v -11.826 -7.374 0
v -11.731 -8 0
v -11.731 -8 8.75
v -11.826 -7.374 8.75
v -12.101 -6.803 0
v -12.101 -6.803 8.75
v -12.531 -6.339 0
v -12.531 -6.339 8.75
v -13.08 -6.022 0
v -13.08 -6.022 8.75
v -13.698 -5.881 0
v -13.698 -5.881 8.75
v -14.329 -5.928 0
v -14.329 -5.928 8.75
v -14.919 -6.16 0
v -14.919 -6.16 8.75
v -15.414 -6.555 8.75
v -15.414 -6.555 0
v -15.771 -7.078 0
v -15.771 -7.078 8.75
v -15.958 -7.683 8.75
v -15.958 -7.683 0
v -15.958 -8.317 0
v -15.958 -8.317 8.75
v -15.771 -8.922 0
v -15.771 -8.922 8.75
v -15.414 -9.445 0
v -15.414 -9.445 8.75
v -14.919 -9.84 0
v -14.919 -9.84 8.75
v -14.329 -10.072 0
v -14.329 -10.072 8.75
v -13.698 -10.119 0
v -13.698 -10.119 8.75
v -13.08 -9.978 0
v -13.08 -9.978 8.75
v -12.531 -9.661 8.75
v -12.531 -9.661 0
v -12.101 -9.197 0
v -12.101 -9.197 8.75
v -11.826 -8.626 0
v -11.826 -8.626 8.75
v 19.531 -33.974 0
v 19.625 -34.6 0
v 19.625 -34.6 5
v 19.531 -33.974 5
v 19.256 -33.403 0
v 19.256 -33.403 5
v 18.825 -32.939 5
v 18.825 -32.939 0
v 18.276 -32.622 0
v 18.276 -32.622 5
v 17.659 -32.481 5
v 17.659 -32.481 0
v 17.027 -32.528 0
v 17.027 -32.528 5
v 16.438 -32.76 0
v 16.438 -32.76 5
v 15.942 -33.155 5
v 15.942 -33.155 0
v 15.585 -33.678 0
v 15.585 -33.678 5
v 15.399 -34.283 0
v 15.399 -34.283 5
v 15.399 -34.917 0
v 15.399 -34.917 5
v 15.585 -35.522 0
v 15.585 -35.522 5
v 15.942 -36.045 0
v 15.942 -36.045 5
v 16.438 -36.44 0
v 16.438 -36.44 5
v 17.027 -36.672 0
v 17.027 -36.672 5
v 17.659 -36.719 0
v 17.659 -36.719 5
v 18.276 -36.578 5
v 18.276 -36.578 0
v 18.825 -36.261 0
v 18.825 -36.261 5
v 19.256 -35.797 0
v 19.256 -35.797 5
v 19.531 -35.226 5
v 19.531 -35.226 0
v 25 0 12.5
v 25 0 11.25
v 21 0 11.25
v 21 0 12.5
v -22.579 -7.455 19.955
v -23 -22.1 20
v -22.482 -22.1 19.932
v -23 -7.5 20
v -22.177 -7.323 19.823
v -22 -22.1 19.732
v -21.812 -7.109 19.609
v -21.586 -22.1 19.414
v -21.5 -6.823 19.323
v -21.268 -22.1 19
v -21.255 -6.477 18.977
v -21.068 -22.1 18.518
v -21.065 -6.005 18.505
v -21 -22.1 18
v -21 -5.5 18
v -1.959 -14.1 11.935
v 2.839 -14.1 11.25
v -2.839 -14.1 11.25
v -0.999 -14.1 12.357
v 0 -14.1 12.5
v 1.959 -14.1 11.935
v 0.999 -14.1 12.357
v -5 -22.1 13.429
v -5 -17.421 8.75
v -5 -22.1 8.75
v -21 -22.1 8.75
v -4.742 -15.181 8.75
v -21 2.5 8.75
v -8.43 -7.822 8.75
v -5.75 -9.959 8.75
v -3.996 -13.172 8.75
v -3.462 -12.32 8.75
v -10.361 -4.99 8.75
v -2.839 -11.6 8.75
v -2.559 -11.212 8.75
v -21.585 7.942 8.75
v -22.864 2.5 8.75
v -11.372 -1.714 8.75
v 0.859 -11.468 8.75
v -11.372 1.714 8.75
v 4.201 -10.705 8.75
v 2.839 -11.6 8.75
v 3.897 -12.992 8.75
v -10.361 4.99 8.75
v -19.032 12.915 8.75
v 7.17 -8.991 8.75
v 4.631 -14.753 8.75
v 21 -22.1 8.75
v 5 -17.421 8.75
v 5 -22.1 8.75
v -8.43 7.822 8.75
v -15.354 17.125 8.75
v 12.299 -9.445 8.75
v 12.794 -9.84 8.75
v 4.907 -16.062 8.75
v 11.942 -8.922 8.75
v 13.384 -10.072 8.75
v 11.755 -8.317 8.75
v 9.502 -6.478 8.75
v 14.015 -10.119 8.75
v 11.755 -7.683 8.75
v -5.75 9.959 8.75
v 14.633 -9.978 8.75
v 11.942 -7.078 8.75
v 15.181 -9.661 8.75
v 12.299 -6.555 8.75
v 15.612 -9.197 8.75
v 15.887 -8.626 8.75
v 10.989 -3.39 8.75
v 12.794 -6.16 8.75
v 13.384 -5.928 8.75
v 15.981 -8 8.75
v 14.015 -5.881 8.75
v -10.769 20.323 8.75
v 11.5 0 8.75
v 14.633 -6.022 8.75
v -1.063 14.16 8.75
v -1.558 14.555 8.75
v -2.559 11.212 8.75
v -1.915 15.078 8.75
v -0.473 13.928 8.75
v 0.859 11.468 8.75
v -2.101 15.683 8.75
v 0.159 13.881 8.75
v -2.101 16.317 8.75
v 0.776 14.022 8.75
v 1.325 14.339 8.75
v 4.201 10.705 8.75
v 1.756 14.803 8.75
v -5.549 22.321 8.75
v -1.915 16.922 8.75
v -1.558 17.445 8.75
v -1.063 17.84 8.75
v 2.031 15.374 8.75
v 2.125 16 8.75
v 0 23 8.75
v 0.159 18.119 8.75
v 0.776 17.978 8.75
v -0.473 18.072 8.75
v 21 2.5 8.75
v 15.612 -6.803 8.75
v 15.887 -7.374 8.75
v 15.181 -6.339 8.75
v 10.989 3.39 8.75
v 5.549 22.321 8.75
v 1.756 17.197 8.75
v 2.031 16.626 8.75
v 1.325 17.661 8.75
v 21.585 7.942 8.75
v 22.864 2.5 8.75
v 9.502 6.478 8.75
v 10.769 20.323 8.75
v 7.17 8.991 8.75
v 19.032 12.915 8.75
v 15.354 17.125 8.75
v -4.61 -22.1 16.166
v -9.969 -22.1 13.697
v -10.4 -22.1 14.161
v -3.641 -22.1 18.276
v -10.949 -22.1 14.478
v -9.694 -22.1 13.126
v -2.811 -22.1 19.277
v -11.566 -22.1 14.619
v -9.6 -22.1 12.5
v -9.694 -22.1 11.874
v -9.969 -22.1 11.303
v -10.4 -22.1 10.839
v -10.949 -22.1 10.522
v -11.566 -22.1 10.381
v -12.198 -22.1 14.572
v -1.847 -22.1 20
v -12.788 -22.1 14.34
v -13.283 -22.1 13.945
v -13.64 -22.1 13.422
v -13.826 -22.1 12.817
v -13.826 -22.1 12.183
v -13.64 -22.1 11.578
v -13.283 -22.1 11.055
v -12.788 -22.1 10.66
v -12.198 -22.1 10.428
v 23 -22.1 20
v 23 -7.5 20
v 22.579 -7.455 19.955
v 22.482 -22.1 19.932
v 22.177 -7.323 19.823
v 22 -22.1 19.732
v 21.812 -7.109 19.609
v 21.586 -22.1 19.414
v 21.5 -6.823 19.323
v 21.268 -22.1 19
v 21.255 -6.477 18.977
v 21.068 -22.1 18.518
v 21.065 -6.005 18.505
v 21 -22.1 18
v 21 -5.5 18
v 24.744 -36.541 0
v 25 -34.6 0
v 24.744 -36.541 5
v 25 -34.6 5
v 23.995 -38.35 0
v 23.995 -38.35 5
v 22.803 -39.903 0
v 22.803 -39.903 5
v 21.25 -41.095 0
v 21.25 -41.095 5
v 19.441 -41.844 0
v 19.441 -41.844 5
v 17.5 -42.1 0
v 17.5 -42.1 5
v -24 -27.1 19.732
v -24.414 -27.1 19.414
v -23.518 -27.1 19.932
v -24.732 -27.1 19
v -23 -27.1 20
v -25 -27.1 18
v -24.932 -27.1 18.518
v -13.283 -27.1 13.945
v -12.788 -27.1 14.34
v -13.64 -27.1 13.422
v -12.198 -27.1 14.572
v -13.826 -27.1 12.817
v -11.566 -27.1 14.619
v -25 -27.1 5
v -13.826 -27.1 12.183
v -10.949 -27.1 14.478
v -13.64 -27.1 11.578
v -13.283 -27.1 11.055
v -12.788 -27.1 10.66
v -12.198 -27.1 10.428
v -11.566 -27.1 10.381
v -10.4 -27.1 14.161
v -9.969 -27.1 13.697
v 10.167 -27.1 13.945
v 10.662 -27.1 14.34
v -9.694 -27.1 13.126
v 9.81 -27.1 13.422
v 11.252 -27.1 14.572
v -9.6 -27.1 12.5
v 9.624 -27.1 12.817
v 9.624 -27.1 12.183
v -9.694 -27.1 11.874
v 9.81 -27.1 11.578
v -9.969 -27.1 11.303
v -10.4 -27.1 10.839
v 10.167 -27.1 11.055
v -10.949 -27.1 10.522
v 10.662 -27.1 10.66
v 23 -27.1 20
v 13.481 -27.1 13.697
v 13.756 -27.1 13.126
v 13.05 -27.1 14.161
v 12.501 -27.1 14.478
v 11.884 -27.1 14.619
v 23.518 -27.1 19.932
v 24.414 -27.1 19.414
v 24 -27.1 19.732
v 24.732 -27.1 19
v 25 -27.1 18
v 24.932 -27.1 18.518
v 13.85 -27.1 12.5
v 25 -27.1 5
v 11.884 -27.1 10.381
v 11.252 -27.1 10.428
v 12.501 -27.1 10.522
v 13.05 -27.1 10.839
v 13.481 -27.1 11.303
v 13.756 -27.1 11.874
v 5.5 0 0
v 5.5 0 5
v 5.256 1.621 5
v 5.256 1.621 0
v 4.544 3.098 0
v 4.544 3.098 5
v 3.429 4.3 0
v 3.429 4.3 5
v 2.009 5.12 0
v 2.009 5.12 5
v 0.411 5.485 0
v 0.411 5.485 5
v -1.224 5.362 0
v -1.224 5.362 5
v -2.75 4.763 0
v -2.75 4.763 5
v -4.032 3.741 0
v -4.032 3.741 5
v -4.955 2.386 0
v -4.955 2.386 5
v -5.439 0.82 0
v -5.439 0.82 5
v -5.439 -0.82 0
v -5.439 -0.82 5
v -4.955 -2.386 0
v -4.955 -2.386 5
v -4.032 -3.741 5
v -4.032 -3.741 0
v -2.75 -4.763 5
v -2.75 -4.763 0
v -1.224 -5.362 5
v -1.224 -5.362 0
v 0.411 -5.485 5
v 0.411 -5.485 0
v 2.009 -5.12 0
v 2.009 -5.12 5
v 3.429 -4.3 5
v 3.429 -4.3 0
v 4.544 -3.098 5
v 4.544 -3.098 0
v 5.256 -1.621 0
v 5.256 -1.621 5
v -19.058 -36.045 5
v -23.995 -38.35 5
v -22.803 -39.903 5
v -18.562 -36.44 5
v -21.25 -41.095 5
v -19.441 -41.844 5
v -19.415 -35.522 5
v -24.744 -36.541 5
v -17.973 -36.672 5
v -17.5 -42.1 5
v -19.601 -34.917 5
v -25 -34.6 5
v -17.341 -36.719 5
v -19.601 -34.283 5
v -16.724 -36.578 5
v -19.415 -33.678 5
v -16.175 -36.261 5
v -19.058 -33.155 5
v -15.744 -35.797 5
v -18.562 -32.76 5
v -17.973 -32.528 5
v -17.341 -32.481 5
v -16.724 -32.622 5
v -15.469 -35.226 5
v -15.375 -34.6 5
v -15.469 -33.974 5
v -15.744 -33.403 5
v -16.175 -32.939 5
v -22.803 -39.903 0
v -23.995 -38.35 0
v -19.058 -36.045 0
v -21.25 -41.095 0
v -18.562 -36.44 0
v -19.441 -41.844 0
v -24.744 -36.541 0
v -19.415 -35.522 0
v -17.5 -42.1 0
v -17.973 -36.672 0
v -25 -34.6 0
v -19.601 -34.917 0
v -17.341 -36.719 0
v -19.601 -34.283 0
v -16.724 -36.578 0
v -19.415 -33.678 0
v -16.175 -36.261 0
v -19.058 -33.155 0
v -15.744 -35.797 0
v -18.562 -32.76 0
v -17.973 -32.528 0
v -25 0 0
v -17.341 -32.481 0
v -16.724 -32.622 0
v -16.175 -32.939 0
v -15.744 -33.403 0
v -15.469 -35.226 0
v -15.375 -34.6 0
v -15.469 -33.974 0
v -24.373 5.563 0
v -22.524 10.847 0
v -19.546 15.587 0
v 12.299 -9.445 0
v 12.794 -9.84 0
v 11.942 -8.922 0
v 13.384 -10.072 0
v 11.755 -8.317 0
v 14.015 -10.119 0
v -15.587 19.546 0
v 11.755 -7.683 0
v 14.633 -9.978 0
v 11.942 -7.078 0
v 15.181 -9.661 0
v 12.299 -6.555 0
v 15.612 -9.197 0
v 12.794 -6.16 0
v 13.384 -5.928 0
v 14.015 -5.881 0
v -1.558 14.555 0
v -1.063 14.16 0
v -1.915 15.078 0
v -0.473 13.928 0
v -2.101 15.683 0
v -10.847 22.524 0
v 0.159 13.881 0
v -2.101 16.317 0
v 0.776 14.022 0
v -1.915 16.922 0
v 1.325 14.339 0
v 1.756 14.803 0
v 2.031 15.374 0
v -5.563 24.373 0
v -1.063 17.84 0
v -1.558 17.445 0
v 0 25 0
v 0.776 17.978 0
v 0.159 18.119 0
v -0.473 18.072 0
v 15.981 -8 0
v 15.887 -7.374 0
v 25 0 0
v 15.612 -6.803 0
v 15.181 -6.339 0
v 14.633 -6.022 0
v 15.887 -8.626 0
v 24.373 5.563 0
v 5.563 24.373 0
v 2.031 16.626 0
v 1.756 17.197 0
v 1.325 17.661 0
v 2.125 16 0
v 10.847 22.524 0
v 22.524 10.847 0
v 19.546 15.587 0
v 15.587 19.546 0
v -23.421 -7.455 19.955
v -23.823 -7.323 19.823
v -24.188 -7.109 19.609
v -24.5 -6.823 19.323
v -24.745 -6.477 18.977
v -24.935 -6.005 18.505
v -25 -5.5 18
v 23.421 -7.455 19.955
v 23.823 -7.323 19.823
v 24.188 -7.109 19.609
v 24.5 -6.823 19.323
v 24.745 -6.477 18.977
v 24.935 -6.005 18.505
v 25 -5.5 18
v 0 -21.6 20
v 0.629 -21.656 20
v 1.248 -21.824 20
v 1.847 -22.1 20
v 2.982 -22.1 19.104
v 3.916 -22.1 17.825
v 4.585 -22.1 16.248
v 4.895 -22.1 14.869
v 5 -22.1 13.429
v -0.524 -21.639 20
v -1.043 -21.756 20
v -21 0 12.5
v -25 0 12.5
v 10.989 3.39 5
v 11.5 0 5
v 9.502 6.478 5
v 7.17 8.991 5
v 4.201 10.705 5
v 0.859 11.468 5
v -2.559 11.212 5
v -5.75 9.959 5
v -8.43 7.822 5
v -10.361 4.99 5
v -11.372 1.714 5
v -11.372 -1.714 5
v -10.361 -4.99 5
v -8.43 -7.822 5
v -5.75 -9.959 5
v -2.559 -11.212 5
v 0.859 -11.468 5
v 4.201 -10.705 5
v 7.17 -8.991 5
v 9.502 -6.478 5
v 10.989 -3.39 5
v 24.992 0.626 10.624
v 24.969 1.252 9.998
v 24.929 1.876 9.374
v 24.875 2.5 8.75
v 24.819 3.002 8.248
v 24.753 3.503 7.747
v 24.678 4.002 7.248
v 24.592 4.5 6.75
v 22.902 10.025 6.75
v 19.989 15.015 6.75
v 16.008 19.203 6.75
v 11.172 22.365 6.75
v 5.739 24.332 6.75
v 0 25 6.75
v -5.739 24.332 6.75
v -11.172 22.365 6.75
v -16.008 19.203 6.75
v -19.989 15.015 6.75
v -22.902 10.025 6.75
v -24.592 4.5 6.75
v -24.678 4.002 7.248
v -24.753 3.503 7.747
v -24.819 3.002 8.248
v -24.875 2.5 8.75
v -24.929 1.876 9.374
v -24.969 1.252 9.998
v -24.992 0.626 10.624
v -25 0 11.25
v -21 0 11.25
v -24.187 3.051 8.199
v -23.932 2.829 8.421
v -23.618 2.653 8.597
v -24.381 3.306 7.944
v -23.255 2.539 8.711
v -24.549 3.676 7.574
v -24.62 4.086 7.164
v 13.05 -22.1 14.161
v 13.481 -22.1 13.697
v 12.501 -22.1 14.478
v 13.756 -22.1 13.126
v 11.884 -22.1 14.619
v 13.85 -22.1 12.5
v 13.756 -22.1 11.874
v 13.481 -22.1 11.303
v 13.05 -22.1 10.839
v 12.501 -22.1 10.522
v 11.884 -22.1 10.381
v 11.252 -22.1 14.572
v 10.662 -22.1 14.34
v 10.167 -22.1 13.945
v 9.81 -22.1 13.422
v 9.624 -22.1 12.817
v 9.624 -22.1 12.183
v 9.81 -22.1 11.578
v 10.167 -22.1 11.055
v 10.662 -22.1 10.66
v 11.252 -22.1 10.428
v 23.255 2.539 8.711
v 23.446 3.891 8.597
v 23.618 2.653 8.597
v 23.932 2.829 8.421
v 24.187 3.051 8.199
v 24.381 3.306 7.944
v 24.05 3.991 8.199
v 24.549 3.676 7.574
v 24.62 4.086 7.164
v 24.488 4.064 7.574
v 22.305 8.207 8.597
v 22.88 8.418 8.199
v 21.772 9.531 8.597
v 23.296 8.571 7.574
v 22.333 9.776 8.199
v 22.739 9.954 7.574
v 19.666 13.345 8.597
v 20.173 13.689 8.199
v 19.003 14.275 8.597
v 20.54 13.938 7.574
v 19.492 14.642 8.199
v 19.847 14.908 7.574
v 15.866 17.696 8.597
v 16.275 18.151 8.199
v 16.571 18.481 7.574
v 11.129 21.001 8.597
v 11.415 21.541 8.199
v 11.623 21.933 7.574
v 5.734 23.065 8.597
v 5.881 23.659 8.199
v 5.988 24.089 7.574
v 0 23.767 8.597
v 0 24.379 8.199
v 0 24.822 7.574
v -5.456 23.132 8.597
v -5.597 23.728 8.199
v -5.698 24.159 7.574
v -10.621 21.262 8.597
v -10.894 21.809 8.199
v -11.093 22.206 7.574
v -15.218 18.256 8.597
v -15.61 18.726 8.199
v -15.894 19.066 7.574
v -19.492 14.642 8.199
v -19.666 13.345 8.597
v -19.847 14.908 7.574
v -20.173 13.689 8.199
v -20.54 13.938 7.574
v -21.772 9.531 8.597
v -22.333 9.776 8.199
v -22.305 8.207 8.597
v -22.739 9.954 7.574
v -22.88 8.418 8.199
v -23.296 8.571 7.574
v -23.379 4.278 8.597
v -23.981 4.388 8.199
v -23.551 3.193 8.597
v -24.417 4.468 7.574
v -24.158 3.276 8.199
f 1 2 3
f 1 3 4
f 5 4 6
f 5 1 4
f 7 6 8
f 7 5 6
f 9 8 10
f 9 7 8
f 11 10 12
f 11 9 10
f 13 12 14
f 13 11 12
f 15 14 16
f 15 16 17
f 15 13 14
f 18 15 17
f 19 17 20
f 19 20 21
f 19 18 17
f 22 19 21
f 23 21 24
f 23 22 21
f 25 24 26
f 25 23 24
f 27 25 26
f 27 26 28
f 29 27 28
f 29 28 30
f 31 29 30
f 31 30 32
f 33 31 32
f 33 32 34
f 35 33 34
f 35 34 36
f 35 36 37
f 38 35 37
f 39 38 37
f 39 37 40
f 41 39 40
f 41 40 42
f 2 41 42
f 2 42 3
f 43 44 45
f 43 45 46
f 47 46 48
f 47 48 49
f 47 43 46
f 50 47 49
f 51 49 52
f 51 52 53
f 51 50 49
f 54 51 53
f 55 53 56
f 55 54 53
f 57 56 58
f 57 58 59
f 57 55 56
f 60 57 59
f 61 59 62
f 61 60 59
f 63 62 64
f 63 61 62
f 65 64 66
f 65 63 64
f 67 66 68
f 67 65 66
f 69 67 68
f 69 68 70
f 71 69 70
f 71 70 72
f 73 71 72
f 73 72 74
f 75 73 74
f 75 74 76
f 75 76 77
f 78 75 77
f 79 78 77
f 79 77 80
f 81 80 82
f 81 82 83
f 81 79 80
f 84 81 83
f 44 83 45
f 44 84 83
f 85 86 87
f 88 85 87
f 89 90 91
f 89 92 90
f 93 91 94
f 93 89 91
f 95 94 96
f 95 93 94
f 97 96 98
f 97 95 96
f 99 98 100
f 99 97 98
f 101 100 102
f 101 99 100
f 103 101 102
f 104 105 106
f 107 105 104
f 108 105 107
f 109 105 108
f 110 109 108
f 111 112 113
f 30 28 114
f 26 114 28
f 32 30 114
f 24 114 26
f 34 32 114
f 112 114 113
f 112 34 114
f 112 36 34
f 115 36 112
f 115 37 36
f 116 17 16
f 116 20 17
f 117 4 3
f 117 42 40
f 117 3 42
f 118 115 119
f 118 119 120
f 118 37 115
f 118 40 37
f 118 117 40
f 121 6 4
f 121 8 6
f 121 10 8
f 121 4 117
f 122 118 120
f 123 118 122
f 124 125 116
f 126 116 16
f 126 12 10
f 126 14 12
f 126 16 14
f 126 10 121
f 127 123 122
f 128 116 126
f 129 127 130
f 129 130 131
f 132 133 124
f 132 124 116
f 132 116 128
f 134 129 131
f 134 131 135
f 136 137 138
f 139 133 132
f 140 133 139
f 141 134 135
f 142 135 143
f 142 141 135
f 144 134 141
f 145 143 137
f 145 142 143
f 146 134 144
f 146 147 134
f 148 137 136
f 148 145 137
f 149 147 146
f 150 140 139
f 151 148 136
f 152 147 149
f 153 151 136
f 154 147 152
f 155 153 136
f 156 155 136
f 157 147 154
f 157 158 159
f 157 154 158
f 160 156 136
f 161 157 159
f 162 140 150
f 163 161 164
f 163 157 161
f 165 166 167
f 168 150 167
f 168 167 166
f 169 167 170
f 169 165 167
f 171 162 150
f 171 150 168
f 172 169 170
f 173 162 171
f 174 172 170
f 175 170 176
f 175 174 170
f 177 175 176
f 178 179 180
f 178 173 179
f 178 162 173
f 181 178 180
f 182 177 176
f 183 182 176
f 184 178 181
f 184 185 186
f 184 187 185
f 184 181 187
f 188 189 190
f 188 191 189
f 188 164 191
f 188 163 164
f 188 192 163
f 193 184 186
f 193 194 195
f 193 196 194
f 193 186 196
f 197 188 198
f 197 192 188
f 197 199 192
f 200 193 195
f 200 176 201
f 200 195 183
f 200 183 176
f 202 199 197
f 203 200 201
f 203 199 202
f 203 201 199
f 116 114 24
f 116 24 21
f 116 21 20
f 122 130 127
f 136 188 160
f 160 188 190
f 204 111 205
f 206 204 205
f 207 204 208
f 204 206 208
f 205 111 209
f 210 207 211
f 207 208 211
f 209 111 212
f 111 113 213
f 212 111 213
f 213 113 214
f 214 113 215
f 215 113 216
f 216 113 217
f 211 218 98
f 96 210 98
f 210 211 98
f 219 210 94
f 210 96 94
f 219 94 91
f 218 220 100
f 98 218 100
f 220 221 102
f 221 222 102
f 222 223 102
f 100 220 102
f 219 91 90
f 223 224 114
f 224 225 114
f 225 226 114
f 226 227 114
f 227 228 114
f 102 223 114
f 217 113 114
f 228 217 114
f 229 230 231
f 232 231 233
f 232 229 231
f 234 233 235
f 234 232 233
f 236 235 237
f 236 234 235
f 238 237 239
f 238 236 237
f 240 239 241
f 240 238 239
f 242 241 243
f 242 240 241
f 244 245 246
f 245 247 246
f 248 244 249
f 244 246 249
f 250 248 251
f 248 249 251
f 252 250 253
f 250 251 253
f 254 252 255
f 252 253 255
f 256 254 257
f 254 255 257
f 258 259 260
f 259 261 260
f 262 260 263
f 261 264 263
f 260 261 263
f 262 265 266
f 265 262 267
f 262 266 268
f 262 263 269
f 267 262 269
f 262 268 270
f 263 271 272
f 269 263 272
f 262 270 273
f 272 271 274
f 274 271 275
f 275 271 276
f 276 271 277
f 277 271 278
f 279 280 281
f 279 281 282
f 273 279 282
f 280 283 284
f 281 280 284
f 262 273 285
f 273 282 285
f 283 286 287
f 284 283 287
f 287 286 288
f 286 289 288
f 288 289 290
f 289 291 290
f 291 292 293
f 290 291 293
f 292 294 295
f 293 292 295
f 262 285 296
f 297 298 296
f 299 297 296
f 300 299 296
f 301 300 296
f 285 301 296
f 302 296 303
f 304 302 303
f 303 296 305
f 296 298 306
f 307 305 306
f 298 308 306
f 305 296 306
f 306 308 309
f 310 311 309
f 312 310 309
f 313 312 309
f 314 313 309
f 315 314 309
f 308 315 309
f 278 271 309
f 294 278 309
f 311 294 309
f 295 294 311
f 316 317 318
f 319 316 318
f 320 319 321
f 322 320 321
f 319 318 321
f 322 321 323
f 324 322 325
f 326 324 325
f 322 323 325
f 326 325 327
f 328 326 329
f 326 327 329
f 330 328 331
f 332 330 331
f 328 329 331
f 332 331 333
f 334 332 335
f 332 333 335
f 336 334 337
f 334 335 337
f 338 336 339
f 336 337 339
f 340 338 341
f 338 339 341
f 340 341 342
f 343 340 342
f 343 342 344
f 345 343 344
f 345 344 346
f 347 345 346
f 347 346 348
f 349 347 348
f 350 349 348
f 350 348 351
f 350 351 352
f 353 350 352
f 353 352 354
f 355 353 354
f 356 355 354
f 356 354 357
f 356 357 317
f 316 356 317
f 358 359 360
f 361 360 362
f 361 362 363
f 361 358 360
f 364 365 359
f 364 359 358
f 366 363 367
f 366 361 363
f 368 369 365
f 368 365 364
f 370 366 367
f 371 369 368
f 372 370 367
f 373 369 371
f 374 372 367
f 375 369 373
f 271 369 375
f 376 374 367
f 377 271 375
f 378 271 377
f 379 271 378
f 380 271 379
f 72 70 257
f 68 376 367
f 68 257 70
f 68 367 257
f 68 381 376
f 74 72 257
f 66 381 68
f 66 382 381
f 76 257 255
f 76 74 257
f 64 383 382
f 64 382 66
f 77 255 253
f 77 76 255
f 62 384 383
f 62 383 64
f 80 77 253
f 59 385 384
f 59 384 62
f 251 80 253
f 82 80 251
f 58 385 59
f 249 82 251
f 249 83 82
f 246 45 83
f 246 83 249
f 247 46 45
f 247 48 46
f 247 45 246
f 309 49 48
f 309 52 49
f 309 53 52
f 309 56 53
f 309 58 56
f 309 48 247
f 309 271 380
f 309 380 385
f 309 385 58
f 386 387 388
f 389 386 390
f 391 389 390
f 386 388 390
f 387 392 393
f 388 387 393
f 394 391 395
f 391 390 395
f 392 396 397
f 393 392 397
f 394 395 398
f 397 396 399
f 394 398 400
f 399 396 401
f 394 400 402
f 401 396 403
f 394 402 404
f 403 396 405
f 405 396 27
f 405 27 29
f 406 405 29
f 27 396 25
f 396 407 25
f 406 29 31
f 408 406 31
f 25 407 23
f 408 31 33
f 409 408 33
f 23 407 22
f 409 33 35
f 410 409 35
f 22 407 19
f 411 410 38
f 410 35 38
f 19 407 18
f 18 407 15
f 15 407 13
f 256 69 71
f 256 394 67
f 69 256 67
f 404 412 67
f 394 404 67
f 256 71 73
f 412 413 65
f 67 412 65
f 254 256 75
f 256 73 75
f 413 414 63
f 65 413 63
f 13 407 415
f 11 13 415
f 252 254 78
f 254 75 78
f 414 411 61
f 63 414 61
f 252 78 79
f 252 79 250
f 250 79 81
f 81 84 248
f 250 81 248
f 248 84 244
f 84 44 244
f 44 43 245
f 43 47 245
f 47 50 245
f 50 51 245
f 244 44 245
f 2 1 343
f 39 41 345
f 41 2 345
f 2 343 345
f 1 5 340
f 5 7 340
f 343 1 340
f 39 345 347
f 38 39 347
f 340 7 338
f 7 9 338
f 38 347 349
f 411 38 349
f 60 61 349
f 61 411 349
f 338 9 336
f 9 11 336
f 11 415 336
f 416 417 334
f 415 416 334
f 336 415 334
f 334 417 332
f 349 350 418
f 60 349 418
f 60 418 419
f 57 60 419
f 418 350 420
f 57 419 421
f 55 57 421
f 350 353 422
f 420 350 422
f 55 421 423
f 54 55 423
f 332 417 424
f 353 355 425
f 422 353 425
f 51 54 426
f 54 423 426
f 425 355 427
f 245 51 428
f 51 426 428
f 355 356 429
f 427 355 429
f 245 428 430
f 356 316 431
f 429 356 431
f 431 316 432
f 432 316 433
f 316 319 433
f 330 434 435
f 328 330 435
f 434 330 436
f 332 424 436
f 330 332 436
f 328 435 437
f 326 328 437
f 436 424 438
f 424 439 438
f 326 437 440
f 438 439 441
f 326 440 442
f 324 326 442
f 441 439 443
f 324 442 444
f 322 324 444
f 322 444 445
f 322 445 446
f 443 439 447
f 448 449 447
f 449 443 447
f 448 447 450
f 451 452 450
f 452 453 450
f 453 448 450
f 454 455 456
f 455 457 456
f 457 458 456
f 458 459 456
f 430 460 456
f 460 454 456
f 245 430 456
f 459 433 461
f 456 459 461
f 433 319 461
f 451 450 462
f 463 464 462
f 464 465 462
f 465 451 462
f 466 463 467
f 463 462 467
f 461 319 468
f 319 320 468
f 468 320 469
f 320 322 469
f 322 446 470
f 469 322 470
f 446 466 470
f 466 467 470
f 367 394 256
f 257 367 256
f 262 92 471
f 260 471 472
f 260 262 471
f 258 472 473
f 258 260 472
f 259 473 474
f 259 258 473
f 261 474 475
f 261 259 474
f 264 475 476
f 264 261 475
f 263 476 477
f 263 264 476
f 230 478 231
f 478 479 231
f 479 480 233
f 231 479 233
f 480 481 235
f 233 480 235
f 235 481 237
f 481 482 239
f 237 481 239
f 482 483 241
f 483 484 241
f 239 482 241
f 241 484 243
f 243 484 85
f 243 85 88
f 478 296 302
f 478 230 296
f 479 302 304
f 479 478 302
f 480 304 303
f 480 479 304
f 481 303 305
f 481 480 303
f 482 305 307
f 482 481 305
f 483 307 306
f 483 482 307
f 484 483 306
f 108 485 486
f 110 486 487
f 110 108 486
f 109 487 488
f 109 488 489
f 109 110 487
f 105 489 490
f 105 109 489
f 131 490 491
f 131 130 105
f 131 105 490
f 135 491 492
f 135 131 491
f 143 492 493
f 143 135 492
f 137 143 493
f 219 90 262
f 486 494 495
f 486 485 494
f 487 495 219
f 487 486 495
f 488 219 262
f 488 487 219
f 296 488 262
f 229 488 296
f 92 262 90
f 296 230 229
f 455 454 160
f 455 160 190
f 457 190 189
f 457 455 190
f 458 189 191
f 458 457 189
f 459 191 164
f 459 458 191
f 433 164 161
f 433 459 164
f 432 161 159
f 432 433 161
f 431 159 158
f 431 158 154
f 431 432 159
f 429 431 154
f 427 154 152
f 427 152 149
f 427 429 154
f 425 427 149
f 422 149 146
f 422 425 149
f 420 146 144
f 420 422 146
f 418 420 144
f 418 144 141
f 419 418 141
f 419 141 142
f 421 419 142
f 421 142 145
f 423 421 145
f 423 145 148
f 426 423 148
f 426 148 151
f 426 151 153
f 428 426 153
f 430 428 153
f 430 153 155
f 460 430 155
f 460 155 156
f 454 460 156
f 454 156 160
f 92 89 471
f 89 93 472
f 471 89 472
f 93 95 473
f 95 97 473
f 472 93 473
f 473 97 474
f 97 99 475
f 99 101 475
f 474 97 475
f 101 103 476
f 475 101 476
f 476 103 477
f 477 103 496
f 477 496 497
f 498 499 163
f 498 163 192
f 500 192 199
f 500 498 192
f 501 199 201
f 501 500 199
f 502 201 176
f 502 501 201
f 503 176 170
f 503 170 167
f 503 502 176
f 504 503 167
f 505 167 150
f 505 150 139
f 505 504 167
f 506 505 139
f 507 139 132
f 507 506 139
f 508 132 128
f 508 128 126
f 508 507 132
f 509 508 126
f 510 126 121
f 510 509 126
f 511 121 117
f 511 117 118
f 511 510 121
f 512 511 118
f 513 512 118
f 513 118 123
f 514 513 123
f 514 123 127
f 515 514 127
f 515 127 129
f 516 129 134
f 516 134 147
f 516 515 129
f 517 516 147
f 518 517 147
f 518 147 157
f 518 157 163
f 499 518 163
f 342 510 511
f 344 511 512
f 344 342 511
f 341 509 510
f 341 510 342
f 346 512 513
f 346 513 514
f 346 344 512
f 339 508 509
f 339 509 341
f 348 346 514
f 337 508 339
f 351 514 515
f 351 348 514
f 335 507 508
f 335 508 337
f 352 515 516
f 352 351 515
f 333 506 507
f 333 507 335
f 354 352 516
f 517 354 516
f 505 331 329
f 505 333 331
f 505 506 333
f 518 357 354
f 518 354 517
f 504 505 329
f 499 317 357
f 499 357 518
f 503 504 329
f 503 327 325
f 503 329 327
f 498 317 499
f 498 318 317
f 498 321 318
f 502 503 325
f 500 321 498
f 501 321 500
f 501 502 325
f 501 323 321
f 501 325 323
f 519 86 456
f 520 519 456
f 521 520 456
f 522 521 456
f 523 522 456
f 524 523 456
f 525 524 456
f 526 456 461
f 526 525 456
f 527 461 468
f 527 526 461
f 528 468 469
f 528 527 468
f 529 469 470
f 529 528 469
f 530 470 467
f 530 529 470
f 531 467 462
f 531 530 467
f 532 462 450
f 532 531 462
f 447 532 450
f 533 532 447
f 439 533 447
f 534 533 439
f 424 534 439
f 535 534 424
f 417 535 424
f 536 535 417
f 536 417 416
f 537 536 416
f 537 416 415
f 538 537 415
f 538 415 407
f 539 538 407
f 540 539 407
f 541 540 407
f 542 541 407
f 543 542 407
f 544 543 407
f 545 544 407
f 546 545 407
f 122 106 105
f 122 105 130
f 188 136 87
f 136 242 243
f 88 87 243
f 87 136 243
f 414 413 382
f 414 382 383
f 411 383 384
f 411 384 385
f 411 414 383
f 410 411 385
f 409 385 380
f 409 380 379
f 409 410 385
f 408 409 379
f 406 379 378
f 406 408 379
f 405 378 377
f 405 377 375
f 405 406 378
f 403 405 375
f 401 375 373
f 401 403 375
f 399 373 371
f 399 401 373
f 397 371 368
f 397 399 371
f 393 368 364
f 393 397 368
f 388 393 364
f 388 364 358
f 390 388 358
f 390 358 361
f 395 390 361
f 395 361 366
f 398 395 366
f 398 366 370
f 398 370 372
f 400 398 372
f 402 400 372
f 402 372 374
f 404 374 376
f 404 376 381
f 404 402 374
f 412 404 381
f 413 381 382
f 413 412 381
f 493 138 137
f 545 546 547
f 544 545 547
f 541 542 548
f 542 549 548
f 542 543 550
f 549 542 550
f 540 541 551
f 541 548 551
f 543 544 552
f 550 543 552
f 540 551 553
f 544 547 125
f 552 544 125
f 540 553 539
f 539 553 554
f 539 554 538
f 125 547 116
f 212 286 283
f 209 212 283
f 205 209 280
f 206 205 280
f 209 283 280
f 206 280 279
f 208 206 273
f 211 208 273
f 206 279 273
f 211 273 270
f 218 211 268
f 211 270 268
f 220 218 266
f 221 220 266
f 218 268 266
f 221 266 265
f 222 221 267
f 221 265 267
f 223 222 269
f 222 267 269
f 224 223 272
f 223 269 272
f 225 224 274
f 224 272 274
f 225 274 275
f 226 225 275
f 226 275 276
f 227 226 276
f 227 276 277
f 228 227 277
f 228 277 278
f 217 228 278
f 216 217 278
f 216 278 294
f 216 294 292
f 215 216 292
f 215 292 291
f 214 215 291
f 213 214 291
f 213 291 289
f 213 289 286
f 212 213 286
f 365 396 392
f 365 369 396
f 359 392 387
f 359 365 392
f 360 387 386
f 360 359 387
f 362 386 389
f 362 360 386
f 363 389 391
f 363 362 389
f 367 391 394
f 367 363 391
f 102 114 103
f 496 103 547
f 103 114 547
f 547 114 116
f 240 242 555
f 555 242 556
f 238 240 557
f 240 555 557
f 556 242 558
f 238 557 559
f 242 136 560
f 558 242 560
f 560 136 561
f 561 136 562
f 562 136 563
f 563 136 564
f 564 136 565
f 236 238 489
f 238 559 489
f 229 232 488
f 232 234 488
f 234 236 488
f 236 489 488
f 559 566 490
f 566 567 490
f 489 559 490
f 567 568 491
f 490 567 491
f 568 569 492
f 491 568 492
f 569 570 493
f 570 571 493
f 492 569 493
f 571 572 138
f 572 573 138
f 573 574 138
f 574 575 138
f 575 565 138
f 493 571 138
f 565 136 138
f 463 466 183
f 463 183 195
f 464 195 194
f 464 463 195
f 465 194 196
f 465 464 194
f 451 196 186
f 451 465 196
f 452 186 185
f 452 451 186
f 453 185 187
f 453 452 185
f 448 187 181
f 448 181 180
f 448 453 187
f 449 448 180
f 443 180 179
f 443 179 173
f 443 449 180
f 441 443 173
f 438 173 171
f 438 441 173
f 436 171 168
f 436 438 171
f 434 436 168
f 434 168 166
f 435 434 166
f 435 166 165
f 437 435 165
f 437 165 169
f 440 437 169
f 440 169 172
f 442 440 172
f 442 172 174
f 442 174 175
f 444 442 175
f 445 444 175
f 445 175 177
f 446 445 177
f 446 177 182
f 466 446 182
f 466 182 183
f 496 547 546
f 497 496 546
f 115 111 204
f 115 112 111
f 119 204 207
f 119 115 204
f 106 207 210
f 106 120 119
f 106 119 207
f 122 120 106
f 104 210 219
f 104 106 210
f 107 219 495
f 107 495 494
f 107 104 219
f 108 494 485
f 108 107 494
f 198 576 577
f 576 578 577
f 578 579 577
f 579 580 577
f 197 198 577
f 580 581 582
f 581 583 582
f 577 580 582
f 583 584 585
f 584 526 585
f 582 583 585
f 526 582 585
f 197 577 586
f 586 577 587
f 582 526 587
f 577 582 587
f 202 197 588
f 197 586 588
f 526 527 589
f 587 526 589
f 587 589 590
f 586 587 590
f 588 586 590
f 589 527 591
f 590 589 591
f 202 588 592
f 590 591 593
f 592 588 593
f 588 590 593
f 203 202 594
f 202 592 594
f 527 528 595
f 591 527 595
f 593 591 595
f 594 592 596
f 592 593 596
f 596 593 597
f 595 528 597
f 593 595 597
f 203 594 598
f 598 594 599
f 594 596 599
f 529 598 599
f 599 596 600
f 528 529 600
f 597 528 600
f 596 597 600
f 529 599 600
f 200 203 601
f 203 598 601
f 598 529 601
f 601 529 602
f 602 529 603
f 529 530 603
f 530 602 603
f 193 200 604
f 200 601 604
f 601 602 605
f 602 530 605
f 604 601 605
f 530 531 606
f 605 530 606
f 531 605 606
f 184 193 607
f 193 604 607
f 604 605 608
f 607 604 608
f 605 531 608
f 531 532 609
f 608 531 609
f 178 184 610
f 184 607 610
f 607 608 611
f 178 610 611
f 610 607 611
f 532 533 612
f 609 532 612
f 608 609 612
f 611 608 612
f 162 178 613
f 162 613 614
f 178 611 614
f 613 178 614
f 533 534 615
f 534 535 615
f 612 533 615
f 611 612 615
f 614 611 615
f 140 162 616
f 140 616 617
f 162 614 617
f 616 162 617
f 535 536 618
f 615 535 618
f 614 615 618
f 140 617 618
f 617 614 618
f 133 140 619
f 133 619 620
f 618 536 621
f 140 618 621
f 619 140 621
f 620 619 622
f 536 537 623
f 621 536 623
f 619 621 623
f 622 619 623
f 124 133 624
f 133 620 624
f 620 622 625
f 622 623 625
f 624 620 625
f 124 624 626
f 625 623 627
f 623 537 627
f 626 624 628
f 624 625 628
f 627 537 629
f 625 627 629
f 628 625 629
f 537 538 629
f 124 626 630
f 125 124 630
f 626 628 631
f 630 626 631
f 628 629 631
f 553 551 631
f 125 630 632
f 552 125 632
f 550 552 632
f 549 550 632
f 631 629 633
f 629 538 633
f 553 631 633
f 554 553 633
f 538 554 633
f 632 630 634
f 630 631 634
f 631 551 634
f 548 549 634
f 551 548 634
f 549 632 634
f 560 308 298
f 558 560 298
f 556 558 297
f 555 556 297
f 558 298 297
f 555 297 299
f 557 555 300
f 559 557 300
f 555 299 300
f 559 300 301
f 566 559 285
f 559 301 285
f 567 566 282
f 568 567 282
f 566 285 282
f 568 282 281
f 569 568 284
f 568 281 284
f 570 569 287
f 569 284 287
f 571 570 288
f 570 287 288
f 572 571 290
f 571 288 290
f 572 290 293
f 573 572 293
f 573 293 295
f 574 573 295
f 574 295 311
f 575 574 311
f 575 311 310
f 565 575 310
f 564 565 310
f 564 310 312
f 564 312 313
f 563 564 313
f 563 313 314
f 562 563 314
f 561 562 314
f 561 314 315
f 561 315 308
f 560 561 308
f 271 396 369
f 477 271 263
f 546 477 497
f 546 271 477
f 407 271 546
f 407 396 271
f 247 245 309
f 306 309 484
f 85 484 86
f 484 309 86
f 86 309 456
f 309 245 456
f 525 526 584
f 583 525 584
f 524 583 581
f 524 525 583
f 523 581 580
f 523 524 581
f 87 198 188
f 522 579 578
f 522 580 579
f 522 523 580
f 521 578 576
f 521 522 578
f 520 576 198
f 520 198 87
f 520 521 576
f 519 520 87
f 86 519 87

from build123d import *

# Parameters (mm, degrees)
F0_R          = 2.125
F0_R_2        = 5.25
F1_DEPTH      = 5
F3_DEPTH      = 15
F4_R          = 2.125
F5_DEPTH      = 25
F6_W          = 50
F6_H          = 15
F6_R          = 2.125
F7_DEPTH      = 5
F8_R          = 7.5
F9_SIZE       = 7.5
F10_R         = 2.125
F10_R_2       = 11.5
F11_DEPTH     = 3.75
F12_T1_DEPTH  = 10
F12_T6_DEPTH  = 4
F12_S7_R      = 25
F12_T8_DEPTH  = 4
F12_T12_DEPTH = 4
F12_S13_R     = 25
F12_T14_DEPTH = 4
F13_R         = 4.99999
F14_R         = 1.99999
F15_R         = 5.5
F16_DEPTH     = 25


# Not quite as in the source:
# - a fillet or chamfer that OpenCascade refuses, or shapes differently, is made with other operations: its cross-section is extruded or revolved along the edge and cut away or added
# - a fillet or chamfer is up to 0.001 mm smaller than in the source, because OpenCascade refuses the exact size


with BuildPart() as f1:
    # F0 (on Top) → F1 (new body)
    with BuildSketch(Plane.XY):
        with BuildLine():
            Line((25, -27.1), (25, -22.1))
            Line((25, -22.1), (25, 0))
            ThreePointArc((25, 0), (0, 25), (-25, 0))
            Line((-25, 0), (-25, -22.1))
            Line((-25, -22.1), (-25, -27.1))
            Line((-25, -27.1), (25, -27.1))
        make_face()
        with Locations((-13.8564064606, -8)):
            Circle(F0_R, mode=Mode.SUBTRACT)
        with Locations((13.8564064606, -8)):
            Circle(F0_R, mode=Mode.SUBTRACT)
        Circle(F0_R_2, mode=Mode.SUBTRACT)
        with Locations((0, 16)):
            Circle(F0_R, mode=Mode.SUBTRACT)
    extrude(amount=F1_DEPTH)

    # F2 (on face) → F3 (join)
    with BuildSketch(Plane.XY.offset(5)):
        Polygon((-25, -27.1), (25, -27.1), (25, -22.1), (25, 0), (21, 0), (21, -22.1), (5, -22.1), (5, -14.1), (0, -14.1), (-5, -14.1), (-5, -22.1), (-21, -22.1), (-21, 0), (-25, 0), (-25, -22.1), align=None)
    extrude(amount=F3_DEPTH)

    # F4 (on face) → F5 (cut)
    with BuildSketch(Plane.XZ.offset(27.1)):
        with Locations((-11.725, 12.5)):
            Circle(F4_R)
        with Locations((11.725, 12.5)):
            Circle(F4_R)
    extrude(amount=-F5_DEPTH, mode=Mode.SUBTRACT)

    # F6 (on Top) → F7 (join)
    with BuildSketch(Plane.XY):
        with Locations((0, -34.6)):
            Rectangle(F6_W, F6_H)
        with Locations((-17.5, -34.6)):
            Circle(F6_R, mode=Mode.SUBTRACT)
        with Locations((17.5, -34.6)):
            Circle(F6_R, mode=Mode.SUBTRACT)
    extrude(amount=F7_DEPTH)

    # F8
    f8_edges = [f1.edges().sort_by_distance(p)[0] for p in [
        (-25, -42.1, 2.5),
        (25, -42.1, 2.5),
    ]]
    fillet(f8_edges, radius=F8_R)

    # F9
    f9_edges = [f1.edges().sort_by_distance(p)[0] for p in [
        (0, -14.1, 20),
        (-23, 0, 20),
        (23, 0, 20),
    ]]
    chamfer(f9_edges, length=F9_SIZE)

    # F10 (on face) → F11 (join)
    with BuildSketch(Plane.XY.offset(5)):
        with BuildLine():
            Line((25, -22.1), (25, 0))
            ThreePointArc((25, 0), (0, 25), (-25, 0))
            Line((-25, 0), (-25, -22.1))
            Line((-25, -22.1), (25, -22.1))
        make_face()
        with Locations((-13.8564064606, -8)):
            Circle(F10_R, mode=Mode.SUBTRACT)
        Circle(F10_R_2, mode=Mode.SUBTRACT)
        with Locations((13.8564064606, -8)):
            Circle(F10_R, mode=Mode.SUBTRACT)
        with Locations((0, 16)):
            Circle(F10_R, mode=Mode.SUBTRACT)
    extrude(amount=F11_DEPTH)

    # F12: chamfer of 2.5 on 3 edges, made by hand

    # F12_s2 → F12_t1 (join)
    with BuildSketch(Plane.YZ.offset(-5)):
        with BuildLine():
            Line((-14.1707106781, 11.3207106781), (-11.5292893219, 8.6792893219))
            Line((-11.5292893219, 8.6792893219), (-11.5292893219, 8.6292893219))
            ThreePointArc((-11.5292893219, 8.6292893219), (-12.8146446609, 8.7), (-14.1, 8.7))
            Line((-14.1, 8.7), (-14.15, 8.75))
            ThreePointArc((-14.15, 8.75), (-14.15, 10.0353553391), (-14.2207106781, 11.3207106781))
            Line((-14.2207106781, 11.3207106781), (-14.1707106781, 11.3207106781))
        make_face()
    extrude(amount=F12_T1_DEPTH)


with BuildPart() as f12_tool4:
    # F12_s5 → F12_t6 (new body)
    with BuildSketch(Plane.YZ.offset(-21)):
        with BuildLine():
            Line((-0.0707106781, 11.3207106781), (2.5707106781, 8.6792893219))
            Line((2.5707106781, 8.6792893219), (2.5707106781, 8.6292893219))
            ThreePointArc((2.5707106781, 8.6292893219), (1.2853553391, 8.7), (0, 8.7))
            Line((0, 8.7), (-0.05, 8.75))
            ThreePointArc((-0.05, 8.75), (-0.05, 10.0353553391), (-0.1207106781, 11.3207106781))
            Line((-0.1207106781, 11.3207106781), (-0.0707106781, 11.3207106781))
        make_face()
    extrude(amount=-F12_T6_DEPTH)

    # F12_s7 → F12_t8 (intersect, symmetric)
    with BuildSketch(Plane.XY.offset(10)):
        Circle(F12_S7_R)
    extrude(amount=F12_T8_DEPTH, both=True, mode=Mode.INTERSECT)


with BuildPart() as f1_1:
    add(f1.part)

    # F12_t3: union F12_tool4
    add(f12_tool4.part)


with BuildPart() as f12_tool10:
    # F12_s11 → F12_t12 (new body)
    with BuildSketch(Plane.YZ.offset(25)):
        with BuildLine():
            Line((2.5707106781, 8.6792893219), (-0.0707106781, 11.3207106781))
            Line((-0.0707106781, 11.3207106781), (-0.1207106781, 11.3207106781))
            ThreePointArc((-0.1207106781, 11.3207106781), (-0.05, 10.0353553391), (-0.05, 8.75))
            Line((-0.05, 8.75), (0, 8.7))
            ThreePointArc((0, 8.7), (1.2853553391, 8.7), (2.5707106781, 8.6292893219))
            Line((2.5707106781, 8.6292893219), (2.5707106781, 8.6792893219))
        make_face()
    extrude(amount=-F12_T12_DEPTH)

    # F12_s13 → F12_t14 (intersect, symmetric)
    with BuildSketch(Plane.XY.offset(10)):
        Circle(F12_S13_R)
    extrude(amount=F12_T14_DEPTH, both=True, mode=Mode.INTERSECT)


with BuildPart() as f1_2:
    add(f1_1.part)

    # F12_t9: union F12_tool10
    add(f12_tool10.part)

    # F13 (radius 5 in the source; OpenCascade refuses exactly that, so slightly less here)
    f13_edges = [f1_2.edges().sort_by_distance(p)[0] for p in [
        (5, -17.85, 16.25),
        (-5, -17.85, 16.25),
    ]]
    fillet(f13_edges, radius=F13_R)

    # F14 (radius 2 in the source; OpenCascade refuses exactly that, so slightly less here)
    f14_edges = [f1_2.edges().sort_by_distance(p)[0] for p in [
        (21, -14.8, 20),
        (25, -17.3, 20),
        (-21, -14.8, 20),
        (-25, -17.3, 20),
        (0, 25, 8.75),
    ]]
    fillet(f14_edges, radius=F14_R)

    # F15 (on face) → F16 (cut)
    with BuildSketch(Plane.XY.offset(5)):
        Circle(F15_R)
    extrude(amount=-F16_DEPTH, mode=Mode.SUBTRACT)


solid = f1_2.part
